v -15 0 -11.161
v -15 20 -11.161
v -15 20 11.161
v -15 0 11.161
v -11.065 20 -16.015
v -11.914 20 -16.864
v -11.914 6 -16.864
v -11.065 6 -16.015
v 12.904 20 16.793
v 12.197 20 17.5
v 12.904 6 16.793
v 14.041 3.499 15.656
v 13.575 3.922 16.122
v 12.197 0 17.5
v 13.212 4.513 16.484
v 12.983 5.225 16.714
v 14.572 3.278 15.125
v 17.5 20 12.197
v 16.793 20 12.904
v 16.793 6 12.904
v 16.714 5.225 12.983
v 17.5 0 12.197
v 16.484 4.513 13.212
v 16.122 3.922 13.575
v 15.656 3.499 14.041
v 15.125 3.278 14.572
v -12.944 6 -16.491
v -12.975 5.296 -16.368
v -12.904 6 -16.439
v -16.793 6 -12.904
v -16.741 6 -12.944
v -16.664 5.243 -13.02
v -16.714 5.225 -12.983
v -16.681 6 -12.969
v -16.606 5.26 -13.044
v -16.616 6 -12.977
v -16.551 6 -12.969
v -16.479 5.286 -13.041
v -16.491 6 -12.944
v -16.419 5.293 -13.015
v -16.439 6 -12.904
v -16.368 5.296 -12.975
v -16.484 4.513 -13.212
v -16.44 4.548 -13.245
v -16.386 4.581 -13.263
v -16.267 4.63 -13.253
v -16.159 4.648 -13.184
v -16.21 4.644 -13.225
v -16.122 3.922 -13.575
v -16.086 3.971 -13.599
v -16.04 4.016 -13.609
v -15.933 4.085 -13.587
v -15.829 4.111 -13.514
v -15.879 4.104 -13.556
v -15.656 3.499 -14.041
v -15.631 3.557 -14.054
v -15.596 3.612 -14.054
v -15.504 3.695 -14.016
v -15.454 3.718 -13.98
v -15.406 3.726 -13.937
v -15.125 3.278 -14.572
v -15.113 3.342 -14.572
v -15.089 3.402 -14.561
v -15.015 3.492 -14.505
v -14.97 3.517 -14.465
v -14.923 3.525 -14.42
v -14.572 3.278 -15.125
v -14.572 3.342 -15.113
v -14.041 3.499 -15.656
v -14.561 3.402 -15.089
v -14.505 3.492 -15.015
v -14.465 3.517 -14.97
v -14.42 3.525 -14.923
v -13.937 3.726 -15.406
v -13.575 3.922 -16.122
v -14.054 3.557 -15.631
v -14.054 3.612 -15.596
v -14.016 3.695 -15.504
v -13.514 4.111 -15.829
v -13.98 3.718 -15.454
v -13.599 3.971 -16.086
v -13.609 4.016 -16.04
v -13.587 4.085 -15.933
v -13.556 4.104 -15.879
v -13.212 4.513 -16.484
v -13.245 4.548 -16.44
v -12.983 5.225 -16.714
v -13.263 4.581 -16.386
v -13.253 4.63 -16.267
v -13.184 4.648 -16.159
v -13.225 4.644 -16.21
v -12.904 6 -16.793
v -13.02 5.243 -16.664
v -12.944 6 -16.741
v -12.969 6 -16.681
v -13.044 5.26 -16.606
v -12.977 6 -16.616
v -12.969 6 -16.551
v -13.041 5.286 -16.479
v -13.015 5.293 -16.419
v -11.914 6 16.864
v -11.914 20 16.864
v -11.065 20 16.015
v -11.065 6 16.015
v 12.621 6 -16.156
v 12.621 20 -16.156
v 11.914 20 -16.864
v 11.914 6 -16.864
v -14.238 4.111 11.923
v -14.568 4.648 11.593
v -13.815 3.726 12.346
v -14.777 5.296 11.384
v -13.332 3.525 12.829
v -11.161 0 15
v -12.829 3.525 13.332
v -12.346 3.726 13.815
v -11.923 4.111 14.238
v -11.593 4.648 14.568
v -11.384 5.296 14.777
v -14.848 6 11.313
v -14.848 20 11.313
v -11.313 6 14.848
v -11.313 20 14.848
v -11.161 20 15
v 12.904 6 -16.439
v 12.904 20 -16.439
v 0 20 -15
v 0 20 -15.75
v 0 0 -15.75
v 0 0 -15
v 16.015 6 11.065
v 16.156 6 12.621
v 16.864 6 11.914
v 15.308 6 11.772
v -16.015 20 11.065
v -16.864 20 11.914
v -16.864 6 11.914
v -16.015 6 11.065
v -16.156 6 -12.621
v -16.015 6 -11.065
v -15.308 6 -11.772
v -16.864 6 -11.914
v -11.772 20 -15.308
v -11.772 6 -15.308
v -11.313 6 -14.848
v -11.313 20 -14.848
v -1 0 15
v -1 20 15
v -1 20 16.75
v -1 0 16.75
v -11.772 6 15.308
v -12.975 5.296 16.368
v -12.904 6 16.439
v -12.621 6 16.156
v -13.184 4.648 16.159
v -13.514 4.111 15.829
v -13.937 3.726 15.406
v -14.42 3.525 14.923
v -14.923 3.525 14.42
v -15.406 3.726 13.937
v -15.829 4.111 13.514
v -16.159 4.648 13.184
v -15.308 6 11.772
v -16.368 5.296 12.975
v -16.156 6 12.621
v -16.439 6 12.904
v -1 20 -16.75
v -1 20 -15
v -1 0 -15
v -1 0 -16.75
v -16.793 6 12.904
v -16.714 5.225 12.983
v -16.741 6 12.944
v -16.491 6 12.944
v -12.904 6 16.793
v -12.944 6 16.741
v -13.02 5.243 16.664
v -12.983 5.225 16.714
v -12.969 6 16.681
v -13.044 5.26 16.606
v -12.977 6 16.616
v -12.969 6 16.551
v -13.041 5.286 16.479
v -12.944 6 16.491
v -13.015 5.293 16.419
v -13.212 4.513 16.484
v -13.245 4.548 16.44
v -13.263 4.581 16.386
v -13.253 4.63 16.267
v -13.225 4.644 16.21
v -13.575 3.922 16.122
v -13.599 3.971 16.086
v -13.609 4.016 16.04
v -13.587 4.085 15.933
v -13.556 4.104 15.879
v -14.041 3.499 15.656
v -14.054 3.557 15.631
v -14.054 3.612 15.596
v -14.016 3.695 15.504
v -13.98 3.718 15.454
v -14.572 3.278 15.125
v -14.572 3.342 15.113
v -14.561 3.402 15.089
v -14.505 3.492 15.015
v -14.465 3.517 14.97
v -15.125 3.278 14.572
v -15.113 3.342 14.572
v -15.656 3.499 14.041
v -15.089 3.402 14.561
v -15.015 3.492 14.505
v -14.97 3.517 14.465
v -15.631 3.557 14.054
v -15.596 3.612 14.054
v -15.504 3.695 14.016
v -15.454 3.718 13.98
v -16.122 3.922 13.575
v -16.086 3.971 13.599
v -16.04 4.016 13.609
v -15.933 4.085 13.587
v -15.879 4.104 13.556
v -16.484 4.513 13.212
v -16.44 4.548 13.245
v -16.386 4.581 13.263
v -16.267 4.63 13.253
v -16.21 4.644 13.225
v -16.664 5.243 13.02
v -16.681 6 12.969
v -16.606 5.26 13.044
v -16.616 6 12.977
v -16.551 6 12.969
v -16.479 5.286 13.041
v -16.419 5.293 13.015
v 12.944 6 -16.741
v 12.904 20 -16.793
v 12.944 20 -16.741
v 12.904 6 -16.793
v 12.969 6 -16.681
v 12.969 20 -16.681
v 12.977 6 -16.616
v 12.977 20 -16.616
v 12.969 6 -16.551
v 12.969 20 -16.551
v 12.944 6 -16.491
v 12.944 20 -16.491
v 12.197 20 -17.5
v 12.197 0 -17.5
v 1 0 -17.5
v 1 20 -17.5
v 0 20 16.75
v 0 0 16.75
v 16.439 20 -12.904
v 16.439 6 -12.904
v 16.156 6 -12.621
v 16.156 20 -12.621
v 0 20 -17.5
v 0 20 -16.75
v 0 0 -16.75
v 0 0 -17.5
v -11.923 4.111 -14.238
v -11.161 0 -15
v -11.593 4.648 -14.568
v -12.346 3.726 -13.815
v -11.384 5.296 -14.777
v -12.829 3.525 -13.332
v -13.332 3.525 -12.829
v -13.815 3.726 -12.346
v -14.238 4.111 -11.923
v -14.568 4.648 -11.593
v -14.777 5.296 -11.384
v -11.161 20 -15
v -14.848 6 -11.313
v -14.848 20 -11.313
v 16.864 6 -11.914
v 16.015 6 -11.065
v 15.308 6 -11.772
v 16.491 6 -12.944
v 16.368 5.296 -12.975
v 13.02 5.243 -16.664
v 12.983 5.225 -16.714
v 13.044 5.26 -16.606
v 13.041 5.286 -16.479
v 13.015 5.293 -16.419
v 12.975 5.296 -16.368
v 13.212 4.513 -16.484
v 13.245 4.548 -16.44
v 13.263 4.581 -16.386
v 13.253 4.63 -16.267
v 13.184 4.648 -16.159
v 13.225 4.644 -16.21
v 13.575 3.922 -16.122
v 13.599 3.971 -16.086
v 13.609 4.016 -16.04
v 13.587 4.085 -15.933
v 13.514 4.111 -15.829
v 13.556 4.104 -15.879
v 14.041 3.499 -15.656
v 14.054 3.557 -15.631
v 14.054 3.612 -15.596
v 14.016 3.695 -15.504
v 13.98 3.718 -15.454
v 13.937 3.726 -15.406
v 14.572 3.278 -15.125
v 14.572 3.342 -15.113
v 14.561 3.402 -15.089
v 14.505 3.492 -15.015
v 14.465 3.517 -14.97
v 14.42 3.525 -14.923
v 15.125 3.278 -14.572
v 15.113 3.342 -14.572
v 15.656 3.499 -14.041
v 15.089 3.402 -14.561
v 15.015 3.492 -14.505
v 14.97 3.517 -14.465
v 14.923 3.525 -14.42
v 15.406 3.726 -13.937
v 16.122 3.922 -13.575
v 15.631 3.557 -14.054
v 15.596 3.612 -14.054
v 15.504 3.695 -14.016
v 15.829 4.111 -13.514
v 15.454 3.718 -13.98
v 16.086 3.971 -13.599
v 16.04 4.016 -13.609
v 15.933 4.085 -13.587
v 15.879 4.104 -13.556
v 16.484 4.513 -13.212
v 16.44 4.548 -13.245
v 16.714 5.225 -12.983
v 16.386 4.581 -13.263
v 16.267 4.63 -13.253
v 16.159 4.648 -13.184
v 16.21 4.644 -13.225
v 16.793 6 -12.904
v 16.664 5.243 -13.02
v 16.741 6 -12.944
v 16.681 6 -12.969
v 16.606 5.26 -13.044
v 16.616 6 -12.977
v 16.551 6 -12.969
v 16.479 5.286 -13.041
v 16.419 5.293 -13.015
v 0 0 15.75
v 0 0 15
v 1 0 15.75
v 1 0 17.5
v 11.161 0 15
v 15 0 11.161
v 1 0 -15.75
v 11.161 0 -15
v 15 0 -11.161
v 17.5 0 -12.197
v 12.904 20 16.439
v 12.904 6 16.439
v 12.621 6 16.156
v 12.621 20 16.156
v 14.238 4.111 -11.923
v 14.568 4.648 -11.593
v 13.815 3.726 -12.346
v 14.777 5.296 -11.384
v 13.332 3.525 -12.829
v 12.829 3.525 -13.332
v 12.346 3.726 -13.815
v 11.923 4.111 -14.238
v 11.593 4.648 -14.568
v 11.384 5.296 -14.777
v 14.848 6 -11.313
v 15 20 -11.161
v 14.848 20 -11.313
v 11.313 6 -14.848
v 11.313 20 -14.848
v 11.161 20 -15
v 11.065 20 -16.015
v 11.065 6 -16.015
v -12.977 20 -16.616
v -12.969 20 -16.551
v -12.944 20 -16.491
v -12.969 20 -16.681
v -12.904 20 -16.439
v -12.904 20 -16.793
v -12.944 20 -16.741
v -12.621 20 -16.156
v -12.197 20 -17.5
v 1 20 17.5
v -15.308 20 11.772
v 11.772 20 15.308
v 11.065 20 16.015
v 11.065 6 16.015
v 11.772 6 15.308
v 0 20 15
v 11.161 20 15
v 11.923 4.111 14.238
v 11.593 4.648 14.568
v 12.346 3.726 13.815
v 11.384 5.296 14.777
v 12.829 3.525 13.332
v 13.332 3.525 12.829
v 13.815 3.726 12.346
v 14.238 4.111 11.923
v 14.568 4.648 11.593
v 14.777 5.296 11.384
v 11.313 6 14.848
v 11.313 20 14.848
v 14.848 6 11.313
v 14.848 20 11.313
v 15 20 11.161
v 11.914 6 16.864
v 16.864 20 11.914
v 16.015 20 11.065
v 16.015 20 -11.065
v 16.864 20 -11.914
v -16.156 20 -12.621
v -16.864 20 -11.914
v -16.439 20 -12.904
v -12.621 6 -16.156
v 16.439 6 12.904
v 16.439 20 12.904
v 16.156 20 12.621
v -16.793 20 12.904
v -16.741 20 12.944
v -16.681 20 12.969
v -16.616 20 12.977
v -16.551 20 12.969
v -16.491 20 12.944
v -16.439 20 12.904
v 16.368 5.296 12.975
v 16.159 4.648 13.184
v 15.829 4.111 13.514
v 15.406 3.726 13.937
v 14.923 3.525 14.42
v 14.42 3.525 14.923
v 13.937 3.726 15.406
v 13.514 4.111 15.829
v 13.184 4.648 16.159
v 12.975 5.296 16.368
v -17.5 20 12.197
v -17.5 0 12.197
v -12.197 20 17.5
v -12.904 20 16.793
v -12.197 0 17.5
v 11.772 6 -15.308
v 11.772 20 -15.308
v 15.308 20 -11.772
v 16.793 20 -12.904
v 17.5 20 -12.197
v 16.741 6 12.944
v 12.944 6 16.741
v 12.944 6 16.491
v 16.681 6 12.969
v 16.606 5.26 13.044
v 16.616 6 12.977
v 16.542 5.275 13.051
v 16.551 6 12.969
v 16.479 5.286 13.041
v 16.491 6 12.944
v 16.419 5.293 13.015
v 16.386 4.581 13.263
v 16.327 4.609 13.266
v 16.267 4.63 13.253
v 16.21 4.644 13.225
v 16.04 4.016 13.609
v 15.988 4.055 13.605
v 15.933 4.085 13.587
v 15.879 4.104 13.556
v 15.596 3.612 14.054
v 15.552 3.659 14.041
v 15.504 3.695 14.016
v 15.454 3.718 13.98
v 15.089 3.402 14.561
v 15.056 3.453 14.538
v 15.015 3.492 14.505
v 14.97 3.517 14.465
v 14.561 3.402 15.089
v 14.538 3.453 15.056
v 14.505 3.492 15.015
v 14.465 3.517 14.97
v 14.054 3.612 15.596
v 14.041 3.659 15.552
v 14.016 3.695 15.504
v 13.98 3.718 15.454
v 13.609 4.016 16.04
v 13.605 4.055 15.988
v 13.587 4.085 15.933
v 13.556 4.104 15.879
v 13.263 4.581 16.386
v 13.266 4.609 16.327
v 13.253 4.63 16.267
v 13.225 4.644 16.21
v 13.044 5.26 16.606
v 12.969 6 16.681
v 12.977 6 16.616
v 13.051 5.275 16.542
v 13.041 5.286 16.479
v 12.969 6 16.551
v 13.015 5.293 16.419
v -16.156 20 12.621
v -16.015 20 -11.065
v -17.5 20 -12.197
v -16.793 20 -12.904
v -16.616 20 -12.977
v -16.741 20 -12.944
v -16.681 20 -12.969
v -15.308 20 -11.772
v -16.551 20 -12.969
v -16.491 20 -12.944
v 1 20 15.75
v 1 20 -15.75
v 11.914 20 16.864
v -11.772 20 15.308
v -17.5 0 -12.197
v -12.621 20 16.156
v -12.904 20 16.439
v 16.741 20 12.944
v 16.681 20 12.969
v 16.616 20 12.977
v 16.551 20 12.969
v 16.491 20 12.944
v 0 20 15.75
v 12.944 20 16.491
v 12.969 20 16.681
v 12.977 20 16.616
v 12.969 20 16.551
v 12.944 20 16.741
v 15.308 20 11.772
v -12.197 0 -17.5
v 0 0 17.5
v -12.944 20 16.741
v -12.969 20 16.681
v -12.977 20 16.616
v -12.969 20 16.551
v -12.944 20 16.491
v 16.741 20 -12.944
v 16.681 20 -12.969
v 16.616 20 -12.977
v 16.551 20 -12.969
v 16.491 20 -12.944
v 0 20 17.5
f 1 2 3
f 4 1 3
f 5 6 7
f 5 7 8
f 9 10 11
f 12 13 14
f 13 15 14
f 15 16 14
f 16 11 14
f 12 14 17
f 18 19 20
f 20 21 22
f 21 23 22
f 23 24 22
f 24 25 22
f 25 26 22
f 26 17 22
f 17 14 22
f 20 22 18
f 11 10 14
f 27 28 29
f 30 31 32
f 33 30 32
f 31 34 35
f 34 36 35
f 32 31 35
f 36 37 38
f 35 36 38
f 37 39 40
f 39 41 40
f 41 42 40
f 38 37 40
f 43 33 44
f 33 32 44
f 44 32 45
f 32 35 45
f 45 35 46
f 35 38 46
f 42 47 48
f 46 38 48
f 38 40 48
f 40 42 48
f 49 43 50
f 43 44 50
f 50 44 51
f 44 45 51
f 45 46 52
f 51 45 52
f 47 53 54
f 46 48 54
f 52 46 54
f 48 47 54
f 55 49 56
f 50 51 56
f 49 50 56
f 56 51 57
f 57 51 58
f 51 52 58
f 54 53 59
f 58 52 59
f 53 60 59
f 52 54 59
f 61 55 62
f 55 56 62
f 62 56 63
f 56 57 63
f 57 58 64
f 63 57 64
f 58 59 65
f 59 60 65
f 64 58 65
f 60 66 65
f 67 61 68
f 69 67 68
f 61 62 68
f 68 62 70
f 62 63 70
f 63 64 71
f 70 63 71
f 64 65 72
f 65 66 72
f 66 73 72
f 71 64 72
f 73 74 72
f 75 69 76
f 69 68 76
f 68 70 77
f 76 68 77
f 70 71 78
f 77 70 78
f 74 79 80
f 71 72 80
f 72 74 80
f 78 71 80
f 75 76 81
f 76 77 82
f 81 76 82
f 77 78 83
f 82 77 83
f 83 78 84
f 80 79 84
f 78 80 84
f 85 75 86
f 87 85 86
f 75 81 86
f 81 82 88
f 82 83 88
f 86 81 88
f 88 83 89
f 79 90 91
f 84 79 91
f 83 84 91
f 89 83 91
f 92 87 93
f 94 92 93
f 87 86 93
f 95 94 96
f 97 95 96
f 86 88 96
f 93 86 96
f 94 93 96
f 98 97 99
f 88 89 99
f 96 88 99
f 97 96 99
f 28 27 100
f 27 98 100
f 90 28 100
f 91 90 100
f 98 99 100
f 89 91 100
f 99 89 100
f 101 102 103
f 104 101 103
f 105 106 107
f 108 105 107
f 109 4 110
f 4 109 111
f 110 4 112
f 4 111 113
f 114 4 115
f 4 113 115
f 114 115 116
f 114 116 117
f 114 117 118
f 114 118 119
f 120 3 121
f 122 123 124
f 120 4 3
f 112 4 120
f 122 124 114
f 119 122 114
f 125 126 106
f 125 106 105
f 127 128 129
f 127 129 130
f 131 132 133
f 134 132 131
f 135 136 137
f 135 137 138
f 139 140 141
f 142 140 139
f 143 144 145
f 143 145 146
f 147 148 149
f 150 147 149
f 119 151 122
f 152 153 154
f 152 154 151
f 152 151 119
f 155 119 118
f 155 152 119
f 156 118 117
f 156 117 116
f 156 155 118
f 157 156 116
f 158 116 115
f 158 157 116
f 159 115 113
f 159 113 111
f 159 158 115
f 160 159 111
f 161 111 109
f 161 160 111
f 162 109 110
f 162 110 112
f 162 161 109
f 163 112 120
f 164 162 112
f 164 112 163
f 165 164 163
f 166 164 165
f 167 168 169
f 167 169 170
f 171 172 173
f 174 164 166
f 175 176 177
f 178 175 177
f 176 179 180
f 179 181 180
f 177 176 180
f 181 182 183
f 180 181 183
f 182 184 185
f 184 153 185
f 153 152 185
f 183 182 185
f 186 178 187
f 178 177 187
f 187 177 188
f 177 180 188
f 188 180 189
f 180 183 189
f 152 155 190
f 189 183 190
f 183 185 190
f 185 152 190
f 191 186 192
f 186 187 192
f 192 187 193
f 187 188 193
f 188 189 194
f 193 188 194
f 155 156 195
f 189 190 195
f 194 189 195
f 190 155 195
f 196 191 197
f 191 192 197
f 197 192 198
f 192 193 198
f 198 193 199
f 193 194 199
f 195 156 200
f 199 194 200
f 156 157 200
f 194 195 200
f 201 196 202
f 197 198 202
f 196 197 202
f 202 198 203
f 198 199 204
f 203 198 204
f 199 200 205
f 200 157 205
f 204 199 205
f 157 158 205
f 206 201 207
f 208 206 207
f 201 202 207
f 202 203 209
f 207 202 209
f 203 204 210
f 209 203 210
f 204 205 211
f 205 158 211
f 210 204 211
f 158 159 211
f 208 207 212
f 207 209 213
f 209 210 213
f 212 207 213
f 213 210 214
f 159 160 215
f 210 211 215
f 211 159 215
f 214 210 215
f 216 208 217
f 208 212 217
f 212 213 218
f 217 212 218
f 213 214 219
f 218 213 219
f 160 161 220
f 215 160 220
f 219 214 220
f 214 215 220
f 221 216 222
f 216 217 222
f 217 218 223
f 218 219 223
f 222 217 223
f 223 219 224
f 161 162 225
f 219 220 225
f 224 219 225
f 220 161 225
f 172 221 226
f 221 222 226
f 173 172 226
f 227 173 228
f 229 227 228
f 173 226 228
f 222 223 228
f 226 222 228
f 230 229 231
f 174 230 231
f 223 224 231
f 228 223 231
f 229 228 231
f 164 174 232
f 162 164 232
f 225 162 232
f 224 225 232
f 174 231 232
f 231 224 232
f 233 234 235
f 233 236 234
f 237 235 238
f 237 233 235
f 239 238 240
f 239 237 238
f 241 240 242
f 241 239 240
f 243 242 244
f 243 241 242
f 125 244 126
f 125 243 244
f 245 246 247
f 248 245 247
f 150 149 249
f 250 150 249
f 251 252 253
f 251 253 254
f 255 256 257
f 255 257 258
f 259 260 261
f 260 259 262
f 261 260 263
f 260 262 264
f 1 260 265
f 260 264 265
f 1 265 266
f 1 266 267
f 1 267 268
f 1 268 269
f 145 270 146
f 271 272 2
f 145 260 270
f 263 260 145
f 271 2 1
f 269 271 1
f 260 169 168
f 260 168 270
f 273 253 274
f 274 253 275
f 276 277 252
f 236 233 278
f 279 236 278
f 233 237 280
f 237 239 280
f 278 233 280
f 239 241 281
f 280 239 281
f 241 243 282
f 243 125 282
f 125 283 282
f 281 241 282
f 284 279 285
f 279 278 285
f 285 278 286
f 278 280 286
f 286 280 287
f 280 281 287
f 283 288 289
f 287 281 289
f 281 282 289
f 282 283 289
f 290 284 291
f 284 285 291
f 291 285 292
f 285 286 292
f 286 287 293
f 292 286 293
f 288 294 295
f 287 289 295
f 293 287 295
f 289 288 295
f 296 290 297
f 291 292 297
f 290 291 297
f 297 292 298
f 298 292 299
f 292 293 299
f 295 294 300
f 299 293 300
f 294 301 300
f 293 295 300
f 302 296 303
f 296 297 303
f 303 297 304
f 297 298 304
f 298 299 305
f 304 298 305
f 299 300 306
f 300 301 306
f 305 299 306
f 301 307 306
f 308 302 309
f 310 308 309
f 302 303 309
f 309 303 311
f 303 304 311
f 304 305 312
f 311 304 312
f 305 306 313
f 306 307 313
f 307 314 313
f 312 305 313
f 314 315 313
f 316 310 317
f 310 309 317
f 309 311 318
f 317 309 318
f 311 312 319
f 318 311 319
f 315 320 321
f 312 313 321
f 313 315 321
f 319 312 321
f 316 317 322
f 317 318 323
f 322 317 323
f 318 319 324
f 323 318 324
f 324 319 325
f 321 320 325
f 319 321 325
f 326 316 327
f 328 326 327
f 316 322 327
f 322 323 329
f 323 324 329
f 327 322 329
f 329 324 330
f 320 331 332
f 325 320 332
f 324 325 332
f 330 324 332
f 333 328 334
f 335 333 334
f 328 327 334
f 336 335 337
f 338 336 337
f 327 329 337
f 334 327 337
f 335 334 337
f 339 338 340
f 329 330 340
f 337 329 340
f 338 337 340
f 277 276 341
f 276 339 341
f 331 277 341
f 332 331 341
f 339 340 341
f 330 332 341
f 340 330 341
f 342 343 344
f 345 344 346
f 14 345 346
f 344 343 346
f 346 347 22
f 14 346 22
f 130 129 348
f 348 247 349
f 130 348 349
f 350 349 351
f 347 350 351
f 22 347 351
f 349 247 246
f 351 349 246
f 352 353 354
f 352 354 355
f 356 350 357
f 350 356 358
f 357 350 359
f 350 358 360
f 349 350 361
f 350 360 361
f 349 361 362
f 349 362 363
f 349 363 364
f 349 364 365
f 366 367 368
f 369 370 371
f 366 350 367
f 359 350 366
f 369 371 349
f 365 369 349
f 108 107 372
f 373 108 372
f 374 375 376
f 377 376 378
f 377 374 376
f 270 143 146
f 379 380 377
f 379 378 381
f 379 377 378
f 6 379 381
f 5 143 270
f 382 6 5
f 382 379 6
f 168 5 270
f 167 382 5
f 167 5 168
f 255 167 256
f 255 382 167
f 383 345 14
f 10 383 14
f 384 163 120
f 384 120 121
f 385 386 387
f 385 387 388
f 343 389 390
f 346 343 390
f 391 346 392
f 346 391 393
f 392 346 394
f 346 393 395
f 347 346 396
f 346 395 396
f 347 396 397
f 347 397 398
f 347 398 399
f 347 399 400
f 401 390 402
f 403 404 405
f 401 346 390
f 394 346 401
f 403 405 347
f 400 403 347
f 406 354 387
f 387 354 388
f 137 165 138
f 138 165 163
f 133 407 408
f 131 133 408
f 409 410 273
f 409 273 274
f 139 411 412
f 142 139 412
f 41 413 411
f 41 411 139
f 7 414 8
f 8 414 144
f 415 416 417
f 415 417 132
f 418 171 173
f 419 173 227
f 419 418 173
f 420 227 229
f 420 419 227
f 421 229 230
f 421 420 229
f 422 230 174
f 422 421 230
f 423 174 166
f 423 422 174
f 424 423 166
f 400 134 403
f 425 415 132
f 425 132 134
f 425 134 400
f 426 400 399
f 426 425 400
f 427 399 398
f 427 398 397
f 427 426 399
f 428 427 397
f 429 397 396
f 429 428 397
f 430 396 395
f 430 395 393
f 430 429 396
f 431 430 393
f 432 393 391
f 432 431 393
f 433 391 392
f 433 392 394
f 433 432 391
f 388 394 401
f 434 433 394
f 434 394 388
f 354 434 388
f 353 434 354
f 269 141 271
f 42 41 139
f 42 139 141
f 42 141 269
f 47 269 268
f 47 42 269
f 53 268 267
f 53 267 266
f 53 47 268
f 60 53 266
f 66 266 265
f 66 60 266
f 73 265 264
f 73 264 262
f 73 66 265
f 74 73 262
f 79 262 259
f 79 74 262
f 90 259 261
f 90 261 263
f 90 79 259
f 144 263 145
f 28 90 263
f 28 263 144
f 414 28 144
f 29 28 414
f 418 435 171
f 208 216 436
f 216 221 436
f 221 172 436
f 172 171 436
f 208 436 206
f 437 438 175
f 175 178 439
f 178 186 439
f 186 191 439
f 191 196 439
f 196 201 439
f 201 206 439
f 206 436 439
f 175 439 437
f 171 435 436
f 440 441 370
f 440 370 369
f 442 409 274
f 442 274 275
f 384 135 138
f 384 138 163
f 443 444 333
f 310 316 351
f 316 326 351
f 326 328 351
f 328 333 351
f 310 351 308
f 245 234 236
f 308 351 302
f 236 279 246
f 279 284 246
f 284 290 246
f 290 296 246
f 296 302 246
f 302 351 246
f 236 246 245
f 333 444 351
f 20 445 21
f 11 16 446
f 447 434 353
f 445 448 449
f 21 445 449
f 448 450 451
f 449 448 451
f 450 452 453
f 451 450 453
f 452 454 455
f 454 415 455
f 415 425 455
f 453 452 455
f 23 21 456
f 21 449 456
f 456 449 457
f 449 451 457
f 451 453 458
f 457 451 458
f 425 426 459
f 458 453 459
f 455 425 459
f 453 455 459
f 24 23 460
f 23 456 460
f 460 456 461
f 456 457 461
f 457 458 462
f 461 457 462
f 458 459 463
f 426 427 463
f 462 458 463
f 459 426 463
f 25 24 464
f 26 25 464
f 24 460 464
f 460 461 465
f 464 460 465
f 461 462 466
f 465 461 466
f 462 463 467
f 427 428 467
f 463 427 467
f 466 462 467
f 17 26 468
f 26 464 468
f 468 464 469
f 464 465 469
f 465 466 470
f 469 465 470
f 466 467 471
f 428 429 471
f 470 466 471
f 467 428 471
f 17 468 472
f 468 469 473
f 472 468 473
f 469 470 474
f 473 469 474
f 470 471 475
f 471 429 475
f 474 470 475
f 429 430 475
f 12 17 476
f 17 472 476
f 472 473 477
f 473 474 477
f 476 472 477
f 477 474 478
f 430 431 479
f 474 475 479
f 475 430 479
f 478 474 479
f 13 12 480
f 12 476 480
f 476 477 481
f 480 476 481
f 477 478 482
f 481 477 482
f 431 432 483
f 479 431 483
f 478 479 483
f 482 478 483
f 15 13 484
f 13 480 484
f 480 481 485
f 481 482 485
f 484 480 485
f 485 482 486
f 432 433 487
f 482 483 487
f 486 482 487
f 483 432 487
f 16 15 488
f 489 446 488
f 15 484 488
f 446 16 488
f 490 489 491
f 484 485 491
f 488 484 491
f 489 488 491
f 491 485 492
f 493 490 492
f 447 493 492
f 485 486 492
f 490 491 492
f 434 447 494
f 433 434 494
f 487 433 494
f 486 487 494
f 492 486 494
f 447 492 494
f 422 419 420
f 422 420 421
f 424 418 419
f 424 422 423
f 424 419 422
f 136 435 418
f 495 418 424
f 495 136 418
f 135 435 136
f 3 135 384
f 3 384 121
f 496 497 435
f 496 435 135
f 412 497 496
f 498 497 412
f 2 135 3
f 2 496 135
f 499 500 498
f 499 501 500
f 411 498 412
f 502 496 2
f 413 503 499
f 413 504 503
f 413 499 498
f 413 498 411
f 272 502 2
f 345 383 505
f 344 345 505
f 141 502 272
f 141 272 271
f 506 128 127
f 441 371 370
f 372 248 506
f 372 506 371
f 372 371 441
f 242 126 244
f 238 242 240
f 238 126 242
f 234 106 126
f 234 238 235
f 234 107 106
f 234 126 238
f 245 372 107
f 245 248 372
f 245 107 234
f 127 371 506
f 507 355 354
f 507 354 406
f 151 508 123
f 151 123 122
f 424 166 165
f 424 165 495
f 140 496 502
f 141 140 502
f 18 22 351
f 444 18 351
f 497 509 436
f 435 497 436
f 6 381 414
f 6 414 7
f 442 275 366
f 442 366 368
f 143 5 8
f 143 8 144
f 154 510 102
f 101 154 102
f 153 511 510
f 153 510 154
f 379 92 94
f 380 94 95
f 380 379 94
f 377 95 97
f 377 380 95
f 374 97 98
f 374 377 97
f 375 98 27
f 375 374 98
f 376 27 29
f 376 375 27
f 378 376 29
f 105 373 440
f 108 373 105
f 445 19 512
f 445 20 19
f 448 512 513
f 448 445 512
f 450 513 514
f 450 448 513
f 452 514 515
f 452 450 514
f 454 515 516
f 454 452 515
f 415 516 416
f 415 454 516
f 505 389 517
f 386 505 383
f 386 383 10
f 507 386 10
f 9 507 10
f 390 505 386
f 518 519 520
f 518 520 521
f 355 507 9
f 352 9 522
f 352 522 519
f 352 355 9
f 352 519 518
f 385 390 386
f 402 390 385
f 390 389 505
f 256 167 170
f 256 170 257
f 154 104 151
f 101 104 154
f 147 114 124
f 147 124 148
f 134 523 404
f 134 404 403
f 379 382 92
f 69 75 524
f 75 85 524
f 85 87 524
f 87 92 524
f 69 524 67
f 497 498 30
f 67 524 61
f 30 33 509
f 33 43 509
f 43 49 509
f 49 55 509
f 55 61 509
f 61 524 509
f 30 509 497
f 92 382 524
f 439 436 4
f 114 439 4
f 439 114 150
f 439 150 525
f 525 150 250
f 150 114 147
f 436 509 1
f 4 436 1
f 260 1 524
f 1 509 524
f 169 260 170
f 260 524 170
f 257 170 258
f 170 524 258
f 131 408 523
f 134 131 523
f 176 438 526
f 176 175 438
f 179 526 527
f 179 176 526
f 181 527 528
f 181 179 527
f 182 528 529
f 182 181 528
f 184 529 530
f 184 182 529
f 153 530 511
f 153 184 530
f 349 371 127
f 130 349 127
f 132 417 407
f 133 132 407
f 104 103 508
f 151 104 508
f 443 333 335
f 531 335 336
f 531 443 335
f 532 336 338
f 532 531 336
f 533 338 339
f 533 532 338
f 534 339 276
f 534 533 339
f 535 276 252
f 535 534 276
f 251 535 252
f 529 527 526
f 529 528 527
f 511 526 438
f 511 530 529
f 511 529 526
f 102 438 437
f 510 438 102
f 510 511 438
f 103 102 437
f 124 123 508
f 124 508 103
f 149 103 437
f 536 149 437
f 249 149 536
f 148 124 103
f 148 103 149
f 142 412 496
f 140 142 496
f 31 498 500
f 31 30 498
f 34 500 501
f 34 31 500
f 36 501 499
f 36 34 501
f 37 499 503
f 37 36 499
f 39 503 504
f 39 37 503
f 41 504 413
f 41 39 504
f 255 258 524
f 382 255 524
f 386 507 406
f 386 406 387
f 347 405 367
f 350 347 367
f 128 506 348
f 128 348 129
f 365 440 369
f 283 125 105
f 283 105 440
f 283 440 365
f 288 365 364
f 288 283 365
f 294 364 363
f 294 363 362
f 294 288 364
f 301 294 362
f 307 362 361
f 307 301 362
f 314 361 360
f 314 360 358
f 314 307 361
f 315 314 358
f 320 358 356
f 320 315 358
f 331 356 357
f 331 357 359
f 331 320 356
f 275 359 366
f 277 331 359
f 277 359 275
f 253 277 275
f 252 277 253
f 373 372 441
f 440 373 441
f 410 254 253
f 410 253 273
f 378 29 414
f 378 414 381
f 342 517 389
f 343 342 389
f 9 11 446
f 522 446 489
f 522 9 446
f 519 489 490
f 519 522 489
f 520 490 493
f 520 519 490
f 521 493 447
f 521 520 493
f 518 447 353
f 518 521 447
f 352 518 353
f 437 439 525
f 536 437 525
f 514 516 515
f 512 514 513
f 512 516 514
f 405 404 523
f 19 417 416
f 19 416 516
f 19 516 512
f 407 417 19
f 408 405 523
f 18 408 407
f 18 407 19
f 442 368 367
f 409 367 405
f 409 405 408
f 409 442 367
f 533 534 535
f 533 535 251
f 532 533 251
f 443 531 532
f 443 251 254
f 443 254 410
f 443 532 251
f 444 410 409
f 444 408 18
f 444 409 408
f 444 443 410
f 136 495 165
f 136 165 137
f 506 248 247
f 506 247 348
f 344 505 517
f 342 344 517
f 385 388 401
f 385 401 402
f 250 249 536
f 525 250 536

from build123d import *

# Parameters (mm, degrees)
BOSS_EXTRUDE1_DEPTH      = 20
CUT_EXTRUDE1_REACH       = 33.82
CUT_EXTRUDE2_REACH       = 51.928
CIRPATTERN3_COUNT        = 4
CUT_EXTRUDE3_DEPTH       = 14
CIRPATTERN4_COUNT        = 4
CIRPATTERN4_COPY_1_DEPTH = 14
CIRPATTERN4_COPY_2_DEPTH = 14
CIRPATTERN4_COPY_3_DEPTH = 14
FILLET1_R                = 0.25
CUT_EXTRUDE4_DEPTH       = 32.819805153


with BuildPart() as part:
    # Sketch1 → Boss-Extrude1 (new body)
    with BuildSketch(Plane(origin=(0, 0, 0), x_dir=(1, 0, 0), z_dir=(0, 1, 0))):
        Polygon((-12.196699141, 17.5), (-17.5, 12.196699141), (-17.5, -12.196699141), (-12.196699141, -17.5), (12.196699141, -17.5), (17.5, -12.196699141), (17.5, 12.196699141), (12.196699141, 17.5), align=None)
    extrude(amount=BOSS_EXTRUDE1_DEPTH)

    # Sketch2 → Cut-Extrude1 (cut, up to next)
    with BuildSketch(Plane(origin=(0, 20, 0), x_dir=(1, 0, 0), z_dir=(0, 1, 0)), mode=Mode.PRIVATE) as cut_extrude1_sk1:
        Polygon((-11.161165235, 15), (-15, 11.161165235), (-15, -11.161165235), (-11.161165235, -15), (11.161165235, -15), (15, -11.161165235), (15, 11.161165235), (11.161165235, 15), align=None)
    cut_extrude1_tool1 = extrude(cut_extrude1_sk1.sketch, amount=-CUT_EXTRUDE1_REACH, mode=Mode.PRIVATE) & part.part
    add(cut_extrude1_tool1.solids().sort_by_distance((0, 20, 0))[0], mode=Mode.SUBTRACT)

    # Sketch4 → Cut-Extrude2 (cut, up to next)
    with BuildSketch(Plane(origin=(14.848349571, 0, 14.848349571), x_dir=(0.7071067811865472, 0, -0.7071067811865478), z_dir=(0.7071067811865478, 0, 0.7071067811865472)), mode=Mode.PRIVATE) as cut_extrude2_sk1:
        with BuildLine():
            Line((-2.5, 20), (2.5, 20))
            Line((2.5, 20), (2.5, 6))
            ThreePointArc((2.5, 6), (0, 3.5), (-2.5, 6))
            Line((-2.5, 6), (-2.5, 20))
        make_face()
    cut_extrude2_tool1 = extrude(cut_extrude2_sk1.sketch, amount=-CUT_EXTRUDE2_REACH, mode=Mode.PRIVATE) & part.part
    cut_extrude2 = cut_extrude2_tool1.solids().sort_by_distance((14.84835, 12.0085, 14.84835))[0]
    add(cut_extrude2, mode=Mode.SUBTRACT)

    # CirPattern3: Cut-Extrude2 ×4 about axis
    cirpattern3_axis = Axis((0, 0, 0), (0, -1, 0))
    for i in range(1, CIRPATTERN3_COUNT):
        add(cut_extrude2.rotate(cirpattern3_axis, i * 360 / CIRPATTERN3_COUNT), mode=Mode.SUBTRACT)

    # Sketch5 → Cut-Extrude3 (cut)
    with BuildSketch(Plane(origin=(0, 20, 0), x_dir=(1, 0, 0), z_dir=(0, 1, 0))):
        Polygon((11.772435072, -15.307968978), (12.62096321, -16.156497116), (11.913856429, -16.863603897), (11.065328291, -16.01507576), align=None)
    cut_extrude3 = extrude(amount=-CUT_EXTRUDE3_DEPTH, mode=Mode.SUBTRACT)

    # Mirror1: Cut-Extrude3 across plane
    add(cut_extrude3.mirror(Plane(origin=(0, 0, 0), x_dir=(0.7071067811865482, 0, 0.7071067811865468), z_dir=(0.7071067811865468, 0, -0.7071067811865482))), mode=Mode.SUBTRACT)

    # CirPattern4: Cut-Extrude3 ×4 about axis
    cirpattern4_axis = Axis((0, 0, 0), (0, -1, 0))
    for i in range(1, CIRPATTERN4_COUNT):
        add(cut_extrude3.rotate(cirpattern4_axis, i * 360 / CIRPATTERN4_COUNT), mode=Mode.SUBTRACT)

    # CirPattern4 copy 1 sketch → CirPattern4 copy 1 (cut)
    with BuildSketch(Plane(origin=(0, 20, 0), x_dir=(-1, 0, 0), z_dir=(0, 1, 0))):
        Polygon((11.772435072, 15.307968978), (12.62096321, 16.156497116), (11.913856429, 16.863603897), (11.065328291, 16.01507576), align=None)
    extrude(amount=-CIRPATTERN4_COPY_1_DEPTH, mode=Mode.SUBTRACT)

    # CirPattern4 copy 2 sketch → CirPattern4 copy 2 (cut)
    with BuildSketch(Plane(origin=(0, 20, 0), x_dir=(0, 0, -1), z_dir=(0, 1, 0))):
        Polygon((11.772435072, 15.307968978), (12.62096321, 16.156497116), (11.913856429, 16.863603897), (11.065328291, 16.01507576), align=None)
    extrude(amount=-CIRPATTERN4_COPY_2_DEPTH, mode=Mode.SUBTRACT)

    # CirPattern4 copy 3 sketch → CirPattern4 copy 3 (cut)
    with BuildSketch(Plane(origin=(0, 20, 0), x_dir=(1, 0, 0), z_dir=(0, 1, 0))):
        Polygon((11.772435072, 15.307968978), (12.62096321, 16.156497116), (11.913856429, 16.863603897), (11.065328291, 16.01507576), align=None)
    extrude(amount=-CIRPATTERN4_COPY_3_DEPTH, mode=Mode.SUBTRACT)

    # Fillet1
    fillet1_edges = [part.edges().sort_by_distance(p)[0] for p in [
        (16.616116524, 13, 13.080582618),
        (14.848349571, 3.5, 14.848349571),
        (13.080582618, 13, 16.616116524),
        (-13.080582618, 13, -16.616116524),
        (-14.848349571, 3.5, -14.848349571),
        (-16.616116524, 13, -13.080582618),
        (16.616116524, 13, -13.080582618),
        (14.848349571, 3.5, -14.848349571),
        (-13.080582618, 13, 16.616116524),
        (-14.848349571, 3.5, 14.848349571),
        (13.080582618, 13, -16.616116524),
        (-16.616116524, 13, 13.080582618),
    ]]
    fillet(fillet1_edges, radius=FILLET1_R)

    # Sketch6 → Cut-Extrude4 (cut, through all)
    with BuildSketch(Plane(origin=(0, 20, 0), x_dir=(1, 0, 0), z_dir=(0, 1, 0))):
        Polygon((0, -15), (-1, -15), (-1, -16.75), (0, -16.75), (0, -17.5), (1, -17.5), (1, -15.75), (0, -15.75), align=None)
    cut_extrude4 = extrude(amount=-CUT_EXTRUDE4_DEPTH, mode=Mode.SUBTRACT)

    # Mirror2: Cut-Extrude4 across plane
    add(cut_extrude4.mirror(Plane.XY), mode=Mode.SUBTRACT)


solid = part.part
